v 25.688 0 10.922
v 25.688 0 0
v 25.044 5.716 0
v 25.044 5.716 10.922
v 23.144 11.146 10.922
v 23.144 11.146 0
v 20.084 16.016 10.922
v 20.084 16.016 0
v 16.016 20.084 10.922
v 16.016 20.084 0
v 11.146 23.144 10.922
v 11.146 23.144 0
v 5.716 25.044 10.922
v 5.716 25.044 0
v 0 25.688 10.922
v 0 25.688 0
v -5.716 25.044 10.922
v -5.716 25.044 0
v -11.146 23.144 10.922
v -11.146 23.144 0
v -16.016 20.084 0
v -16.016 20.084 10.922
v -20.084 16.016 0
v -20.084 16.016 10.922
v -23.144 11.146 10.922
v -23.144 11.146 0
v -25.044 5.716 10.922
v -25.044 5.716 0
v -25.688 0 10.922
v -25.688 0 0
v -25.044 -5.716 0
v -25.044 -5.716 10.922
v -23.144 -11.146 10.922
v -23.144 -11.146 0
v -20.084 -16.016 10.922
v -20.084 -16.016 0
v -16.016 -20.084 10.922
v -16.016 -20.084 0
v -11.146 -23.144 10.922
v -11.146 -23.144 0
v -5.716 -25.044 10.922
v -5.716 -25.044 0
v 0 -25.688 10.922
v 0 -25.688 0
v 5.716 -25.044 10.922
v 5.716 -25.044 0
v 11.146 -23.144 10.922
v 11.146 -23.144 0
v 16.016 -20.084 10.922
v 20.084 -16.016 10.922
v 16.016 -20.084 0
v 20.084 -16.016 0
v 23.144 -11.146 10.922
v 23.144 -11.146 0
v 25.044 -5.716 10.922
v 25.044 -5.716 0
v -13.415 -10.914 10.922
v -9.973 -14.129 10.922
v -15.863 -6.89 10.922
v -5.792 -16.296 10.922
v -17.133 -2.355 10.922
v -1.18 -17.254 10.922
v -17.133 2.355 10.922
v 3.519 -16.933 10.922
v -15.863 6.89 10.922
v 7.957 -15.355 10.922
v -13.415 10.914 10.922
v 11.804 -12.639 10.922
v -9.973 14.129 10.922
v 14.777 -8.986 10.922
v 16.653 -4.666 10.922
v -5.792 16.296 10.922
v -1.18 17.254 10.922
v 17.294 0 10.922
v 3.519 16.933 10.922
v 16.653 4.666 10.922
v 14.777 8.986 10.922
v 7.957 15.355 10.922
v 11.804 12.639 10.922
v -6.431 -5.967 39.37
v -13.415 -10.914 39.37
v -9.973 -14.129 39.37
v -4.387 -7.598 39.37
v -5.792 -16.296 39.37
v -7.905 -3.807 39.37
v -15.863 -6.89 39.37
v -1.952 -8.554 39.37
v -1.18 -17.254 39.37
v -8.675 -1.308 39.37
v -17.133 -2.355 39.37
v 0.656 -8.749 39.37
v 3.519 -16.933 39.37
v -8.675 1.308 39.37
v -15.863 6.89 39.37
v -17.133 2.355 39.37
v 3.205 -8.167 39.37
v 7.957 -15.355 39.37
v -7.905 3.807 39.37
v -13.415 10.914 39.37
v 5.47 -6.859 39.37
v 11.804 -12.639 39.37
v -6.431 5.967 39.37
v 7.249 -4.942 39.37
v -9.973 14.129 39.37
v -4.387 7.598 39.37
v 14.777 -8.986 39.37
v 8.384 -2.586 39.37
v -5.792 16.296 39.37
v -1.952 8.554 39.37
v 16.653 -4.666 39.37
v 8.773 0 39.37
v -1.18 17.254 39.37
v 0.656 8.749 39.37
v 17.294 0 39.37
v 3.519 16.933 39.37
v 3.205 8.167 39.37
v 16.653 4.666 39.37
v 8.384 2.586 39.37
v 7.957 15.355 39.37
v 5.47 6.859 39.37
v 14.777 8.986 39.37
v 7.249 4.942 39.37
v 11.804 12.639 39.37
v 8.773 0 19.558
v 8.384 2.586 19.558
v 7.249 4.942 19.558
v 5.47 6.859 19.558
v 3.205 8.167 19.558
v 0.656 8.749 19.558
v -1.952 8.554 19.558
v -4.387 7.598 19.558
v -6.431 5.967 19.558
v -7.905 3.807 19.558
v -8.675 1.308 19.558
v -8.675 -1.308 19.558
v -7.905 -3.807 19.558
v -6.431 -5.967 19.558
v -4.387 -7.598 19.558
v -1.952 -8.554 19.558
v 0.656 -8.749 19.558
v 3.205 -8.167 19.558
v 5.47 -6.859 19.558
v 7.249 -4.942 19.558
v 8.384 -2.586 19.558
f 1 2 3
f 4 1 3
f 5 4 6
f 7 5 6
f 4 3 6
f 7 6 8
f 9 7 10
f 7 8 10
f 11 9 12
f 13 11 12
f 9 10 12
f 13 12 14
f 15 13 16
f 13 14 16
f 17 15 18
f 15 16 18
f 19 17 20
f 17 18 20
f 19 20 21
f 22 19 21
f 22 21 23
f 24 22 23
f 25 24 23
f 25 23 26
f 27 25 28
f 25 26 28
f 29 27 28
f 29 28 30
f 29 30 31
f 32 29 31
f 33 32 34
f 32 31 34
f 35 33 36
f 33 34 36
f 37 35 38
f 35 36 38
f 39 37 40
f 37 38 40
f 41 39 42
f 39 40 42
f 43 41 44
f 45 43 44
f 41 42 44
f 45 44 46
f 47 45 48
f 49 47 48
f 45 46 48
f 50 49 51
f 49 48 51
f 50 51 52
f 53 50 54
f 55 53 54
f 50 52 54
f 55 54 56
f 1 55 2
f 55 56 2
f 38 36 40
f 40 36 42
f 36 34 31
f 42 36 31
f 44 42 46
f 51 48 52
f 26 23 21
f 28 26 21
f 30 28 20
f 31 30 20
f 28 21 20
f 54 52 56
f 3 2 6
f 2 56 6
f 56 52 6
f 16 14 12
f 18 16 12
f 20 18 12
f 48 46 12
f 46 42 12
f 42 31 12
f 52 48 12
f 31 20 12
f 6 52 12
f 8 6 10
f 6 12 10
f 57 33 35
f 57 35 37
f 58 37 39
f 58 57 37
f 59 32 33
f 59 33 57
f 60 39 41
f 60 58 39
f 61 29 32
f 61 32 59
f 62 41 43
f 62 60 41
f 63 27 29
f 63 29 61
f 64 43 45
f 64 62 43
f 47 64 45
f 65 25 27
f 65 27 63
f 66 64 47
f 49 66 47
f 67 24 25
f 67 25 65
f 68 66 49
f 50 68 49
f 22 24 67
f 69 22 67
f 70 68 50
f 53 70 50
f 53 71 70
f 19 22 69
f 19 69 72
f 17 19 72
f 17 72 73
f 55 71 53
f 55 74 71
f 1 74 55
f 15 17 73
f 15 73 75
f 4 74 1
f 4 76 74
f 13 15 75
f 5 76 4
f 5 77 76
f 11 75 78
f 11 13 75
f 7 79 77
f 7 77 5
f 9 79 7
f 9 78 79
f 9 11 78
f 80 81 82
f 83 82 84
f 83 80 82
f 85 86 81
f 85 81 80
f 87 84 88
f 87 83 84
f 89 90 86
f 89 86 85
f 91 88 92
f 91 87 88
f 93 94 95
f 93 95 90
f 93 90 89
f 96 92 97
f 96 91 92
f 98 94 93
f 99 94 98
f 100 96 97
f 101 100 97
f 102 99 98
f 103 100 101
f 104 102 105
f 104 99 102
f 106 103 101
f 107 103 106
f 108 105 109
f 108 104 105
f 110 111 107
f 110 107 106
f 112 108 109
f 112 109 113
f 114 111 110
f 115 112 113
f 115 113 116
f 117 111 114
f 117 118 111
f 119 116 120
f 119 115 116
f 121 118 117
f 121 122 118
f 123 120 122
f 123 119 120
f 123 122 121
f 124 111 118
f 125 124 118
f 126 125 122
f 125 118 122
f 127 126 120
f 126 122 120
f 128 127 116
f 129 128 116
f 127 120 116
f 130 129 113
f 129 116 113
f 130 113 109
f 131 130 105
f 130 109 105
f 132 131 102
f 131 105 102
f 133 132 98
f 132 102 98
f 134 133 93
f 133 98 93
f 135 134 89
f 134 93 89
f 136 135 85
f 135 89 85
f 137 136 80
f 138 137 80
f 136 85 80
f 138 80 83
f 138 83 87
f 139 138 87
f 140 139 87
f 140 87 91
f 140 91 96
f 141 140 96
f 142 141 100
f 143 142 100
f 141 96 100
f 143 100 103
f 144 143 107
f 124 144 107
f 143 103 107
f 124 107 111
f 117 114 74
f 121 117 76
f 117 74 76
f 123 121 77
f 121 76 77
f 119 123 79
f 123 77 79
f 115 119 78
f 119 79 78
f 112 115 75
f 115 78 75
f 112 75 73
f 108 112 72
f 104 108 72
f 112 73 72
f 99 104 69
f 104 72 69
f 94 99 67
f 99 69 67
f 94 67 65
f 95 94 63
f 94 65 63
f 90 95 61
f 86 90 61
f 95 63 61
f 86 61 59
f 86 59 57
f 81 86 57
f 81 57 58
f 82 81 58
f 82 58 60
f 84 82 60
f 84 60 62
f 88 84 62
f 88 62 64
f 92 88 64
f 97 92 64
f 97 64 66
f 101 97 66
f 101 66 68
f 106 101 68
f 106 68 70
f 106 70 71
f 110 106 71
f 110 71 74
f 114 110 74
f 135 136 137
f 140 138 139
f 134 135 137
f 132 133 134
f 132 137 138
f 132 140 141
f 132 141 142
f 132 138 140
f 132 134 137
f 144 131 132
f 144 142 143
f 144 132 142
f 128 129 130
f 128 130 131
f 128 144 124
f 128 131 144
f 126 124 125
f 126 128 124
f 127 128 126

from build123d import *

# Parameters (mm, degrees)
F0_R     = 25.687791
F0_R_2   = 17.294442
F1_DEPTH = 10.922
F2_DEPTH = 39.37
F3_R     = 8.773481
F4_DEPTH = 19.812


with BuildPart() as f1:
    # F0 (on Top) → F1 (new body)
    with BuildSketch(Plane.XY):
        Circle(F0_R)
        Circle(F0_R_2, mode=Mode.SUBTRACT)
        Circle(F0_R_2)
    extrude(amount=F1_DEPTH)

    # F0 (on Top) → F2 (join)
    with BuildSketch(Plane.XY):
        Circle(F0_R_2)
    extrude(amount=F2_DEPTH)

    # F3 (on face) → F4 (cut)
    with BuildSketch(Plane.XY.offset(39.37)):
        Circle(F3_R)
    extrude(amount=-F4_DEPTH, mode=Mode.SUBTRACT)


solid = f1.part
